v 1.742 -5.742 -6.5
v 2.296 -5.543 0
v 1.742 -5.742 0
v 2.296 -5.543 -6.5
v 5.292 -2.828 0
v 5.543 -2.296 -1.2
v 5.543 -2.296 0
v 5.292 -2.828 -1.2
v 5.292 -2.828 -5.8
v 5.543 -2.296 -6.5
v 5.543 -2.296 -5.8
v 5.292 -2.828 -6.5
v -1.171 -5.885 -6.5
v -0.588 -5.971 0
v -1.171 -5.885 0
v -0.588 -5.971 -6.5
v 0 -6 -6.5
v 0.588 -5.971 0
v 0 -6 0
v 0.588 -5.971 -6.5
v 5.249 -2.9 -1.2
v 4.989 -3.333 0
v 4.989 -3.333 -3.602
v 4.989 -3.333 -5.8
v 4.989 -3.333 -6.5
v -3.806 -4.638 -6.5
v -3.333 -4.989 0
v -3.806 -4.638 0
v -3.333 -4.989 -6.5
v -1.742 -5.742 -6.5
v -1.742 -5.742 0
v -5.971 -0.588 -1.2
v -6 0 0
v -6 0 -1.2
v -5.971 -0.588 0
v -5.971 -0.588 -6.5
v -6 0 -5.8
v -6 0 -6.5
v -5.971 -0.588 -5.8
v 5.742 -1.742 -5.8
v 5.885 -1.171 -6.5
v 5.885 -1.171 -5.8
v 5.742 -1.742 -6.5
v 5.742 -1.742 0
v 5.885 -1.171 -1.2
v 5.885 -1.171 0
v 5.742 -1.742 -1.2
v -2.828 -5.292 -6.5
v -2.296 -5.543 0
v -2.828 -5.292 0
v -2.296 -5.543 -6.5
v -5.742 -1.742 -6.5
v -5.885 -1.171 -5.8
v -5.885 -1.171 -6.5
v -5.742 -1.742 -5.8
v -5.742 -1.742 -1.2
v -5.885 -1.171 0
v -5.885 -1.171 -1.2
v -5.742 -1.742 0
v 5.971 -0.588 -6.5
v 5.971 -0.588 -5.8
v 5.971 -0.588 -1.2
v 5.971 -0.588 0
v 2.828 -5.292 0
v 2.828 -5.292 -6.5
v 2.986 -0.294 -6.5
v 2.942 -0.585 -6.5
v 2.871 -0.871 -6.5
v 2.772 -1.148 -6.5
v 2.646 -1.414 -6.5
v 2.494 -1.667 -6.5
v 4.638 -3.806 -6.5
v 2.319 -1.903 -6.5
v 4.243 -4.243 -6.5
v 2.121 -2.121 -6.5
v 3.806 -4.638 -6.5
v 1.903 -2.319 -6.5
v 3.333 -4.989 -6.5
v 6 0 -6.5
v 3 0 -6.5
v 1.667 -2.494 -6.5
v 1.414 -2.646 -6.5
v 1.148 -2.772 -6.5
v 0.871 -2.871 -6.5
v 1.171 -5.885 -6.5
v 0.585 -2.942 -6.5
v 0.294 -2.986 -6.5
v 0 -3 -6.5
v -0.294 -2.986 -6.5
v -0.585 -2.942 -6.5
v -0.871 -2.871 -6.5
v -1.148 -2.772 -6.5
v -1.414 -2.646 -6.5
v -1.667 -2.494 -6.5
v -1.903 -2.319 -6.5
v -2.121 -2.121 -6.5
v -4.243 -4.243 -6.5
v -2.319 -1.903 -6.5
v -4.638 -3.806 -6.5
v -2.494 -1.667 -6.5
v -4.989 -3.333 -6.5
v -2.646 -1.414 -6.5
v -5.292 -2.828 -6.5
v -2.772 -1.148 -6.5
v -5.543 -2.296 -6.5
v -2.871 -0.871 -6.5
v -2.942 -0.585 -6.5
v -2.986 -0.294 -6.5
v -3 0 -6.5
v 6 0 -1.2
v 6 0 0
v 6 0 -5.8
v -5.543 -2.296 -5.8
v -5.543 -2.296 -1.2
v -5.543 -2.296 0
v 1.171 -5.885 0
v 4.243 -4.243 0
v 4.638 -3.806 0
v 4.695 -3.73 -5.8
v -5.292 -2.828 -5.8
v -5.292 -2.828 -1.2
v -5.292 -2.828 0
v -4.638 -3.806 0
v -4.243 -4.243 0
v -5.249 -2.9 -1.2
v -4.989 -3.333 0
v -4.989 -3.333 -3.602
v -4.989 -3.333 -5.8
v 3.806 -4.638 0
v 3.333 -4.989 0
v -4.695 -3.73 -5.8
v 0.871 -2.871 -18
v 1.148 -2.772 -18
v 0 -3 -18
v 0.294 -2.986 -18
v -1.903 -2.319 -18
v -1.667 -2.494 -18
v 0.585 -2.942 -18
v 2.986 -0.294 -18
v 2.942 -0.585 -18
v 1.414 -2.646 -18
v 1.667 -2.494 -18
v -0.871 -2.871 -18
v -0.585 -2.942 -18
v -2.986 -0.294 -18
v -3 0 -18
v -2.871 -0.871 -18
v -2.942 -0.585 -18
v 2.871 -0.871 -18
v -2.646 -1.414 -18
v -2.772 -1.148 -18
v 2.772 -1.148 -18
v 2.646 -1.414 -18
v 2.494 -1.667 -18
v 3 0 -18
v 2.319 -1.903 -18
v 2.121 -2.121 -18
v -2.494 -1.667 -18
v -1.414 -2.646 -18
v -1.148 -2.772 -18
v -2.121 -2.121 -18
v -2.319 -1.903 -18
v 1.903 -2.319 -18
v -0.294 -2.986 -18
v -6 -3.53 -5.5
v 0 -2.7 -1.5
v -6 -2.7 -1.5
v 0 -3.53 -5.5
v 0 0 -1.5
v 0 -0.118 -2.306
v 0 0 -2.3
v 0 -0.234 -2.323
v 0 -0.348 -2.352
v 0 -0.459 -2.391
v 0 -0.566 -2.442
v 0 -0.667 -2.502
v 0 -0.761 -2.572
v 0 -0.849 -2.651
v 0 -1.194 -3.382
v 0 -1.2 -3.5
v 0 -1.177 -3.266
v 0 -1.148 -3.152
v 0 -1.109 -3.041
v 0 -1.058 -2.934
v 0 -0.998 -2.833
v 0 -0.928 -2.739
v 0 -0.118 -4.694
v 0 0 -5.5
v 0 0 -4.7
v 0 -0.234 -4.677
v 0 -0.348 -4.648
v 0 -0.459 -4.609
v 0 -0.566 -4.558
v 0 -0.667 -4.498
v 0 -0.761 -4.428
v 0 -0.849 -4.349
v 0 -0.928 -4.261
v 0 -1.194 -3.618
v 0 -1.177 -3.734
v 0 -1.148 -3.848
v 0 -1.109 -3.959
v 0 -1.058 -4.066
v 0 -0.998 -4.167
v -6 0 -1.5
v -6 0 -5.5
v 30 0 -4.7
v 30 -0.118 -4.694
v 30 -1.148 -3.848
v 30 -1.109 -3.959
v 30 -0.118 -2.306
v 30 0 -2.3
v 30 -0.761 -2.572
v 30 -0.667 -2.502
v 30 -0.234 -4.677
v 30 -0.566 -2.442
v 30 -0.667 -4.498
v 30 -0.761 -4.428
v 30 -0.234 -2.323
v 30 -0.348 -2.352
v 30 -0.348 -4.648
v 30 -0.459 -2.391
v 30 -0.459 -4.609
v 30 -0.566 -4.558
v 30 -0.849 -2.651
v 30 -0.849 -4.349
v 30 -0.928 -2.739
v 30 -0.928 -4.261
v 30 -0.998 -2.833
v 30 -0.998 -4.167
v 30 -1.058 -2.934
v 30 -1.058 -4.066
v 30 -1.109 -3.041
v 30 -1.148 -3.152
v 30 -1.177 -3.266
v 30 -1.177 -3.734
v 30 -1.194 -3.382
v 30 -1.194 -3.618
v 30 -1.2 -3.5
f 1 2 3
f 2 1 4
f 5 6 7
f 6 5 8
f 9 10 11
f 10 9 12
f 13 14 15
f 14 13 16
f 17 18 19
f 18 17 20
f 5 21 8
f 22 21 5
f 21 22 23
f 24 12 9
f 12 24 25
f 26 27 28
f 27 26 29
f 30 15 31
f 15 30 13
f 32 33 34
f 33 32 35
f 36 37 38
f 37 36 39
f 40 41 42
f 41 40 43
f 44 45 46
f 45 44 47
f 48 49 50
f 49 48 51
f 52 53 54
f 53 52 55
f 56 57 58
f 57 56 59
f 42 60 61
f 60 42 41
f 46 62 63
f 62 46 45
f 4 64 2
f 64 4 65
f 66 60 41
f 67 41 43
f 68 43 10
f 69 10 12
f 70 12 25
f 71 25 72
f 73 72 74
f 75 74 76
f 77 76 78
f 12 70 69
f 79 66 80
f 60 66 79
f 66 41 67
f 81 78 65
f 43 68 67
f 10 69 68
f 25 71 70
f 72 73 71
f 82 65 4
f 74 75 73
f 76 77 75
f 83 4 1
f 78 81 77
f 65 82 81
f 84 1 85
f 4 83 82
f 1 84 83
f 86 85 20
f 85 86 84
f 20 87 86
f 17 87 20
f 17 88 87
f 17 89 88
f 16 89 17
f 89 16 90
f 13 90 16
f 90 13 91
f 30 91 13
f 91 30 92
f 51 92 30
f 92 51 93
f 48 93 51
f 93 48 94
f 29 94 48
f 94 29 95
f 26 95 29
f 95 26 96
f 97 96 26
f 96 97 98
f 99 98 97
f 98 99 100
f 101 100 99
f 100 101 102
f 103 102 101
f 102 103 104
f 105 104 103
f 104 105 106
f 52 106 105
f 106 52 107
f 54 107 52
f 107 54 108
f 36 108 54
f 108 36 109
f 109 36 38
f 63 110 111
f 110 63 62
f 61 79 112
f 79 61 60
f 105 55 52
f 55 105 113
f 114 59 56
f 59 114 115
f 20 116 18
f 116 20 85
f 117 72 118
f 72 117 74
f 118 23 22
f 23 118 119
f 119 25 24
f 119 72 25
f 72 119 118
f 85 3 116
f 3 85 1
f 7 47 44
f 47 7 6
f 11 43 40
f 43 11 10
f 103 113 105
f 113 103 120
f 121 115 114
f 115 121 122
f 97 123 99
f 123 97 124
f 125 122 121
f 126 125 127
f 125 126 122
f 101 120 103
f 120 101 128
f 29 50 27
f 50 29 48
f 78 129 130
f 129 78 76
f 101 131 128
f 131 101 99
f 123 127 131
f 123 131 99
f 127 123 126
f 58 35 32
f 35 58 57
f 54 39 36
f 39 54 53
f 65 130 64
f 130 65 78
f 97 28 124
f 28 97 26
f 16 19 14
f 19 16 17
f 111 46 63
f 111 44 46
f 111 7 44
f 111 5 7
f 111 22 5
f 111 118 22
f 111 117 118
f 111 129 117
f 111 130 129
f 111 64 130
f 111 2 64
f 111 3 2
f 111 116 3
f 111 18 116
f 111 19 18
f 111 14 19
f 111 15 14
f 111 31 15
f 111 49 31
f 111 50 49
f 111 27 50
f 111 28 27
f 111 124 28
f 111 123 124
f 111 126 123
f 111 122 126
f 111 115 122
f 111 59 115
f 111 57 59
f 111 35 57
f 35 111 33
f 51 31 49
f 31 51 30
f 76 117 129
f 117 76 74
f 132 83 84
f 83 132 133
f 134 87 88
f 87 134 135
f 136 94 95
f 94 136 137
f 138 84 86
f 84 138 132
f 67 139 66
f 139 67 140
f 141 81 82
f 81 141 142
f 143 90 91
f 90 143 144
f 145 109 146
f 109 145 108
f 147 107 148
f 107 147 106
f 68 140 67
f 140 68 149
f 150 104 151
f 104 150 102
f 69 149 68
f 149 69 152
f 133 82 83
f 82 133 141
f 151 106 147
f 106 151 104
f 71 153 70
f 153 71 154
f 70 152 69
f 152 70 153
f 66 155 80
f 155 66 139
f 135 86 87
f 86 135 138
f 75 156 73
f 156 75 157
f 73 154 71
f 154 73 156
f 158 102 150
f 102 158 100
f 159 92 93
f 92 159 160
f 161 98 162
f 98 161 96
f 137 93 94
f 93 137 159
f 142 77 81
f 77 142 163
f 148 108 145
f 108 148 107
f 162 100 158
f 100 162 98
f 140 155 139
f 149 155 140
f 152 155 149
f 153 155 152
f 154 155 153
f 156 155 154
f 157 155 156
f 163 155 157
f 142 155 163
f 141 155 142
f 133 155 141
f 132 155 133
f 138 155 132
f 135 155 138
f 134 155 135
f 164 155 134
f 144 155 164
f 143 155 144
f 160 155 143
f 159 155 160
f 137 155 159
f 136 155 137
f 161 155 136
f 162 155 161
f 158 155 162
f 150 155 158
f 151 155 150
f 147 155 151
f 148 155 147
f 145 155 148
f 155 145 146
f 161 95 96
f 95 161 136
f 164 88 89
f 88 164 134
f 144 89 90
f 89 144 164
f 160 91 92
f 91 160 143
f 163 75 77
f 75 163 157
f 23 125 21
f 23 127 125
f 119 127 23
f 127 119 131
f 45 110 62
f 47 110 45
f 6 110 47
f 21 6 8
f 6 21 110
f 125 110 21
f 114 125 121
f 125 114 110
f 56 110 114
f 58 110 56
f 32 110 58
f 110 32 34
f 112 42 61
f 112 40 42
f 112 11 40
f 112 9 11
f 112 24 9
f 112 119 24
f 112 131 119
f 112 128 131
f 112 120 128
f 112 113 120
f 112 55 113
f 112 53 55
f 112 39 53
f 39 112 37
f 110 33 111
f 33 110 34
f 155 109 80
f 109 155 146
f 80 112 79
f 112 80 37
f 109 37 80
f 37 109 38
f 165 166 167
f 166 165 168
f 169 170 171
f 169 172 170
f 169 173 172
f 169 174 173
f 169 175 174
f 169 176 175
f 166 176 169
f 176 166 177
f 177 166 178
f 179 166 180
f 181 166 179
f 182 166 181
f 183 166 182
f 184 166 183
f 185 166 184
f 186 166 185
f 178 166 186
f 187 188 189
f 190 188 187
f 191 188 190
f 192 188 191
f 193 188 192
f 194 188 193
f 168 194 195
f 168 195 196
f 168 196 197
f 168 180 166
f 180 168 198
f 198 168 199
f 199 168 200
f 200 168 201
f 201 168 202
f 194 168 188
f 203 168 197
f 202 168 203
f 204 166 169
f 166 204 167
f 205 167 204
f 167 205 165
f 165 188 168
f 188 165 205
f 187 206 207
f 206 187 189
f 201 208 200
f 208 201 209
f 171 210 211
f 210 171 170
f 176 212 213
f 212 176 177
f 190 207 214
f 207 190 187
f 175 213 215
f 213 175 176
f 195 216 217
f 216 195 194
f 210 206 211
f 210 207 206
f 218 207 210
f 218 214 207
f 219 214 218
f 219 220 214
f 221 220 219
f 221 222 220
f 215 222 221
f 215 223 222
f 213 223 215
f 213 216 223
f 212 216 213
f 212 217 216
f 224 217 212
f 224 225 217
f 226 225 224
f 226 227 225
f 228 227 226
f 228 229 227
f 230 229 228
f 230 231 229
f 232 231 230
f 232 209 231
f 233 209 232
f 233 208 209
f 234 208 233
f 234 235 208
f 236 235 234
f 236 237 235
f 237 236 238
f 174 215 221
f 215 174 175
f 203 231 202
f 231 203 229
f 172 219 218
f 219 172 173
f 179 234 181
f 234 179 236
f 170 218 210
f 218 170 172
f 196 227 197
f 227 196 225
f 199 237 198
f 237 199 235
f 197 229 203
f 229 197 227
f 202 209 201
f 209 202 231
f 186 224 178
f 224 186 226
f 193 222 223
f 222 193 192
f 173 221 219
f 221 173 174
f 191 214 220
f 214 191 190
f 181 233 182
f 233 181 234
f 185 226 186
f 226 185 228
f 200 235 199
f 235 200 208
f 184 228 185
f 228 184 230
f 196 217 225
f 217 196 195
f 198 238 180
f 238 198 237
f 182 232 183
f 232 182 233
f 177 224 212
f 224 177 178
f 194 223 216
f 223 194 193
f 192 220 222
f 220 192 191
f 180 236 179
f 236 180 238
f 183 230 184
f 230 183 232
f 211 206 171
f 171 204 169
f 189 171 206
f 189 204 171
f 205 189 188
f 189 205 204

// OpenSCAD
// file: B_dovetail.scad
// =============================================================================
// Design B — Co-printed dovetail / T-slot mechanical interlock (PRIMARY)
// =============================================================================
// PETG strut tip ends in a captive dovetail / T-slot socket; the TPU cable is
// terminated in a matching dovetail / T-head co-printed inside the socket.
// Per Edison Phase-3 ANALYSIS 19e0c868 §2 (CAD review) geometry, which
// supersedes the earlier ce84ddf8 §4 numbers:
//   - Node OD:                 12.0 mm (was 9.0; needed for >=2 perimeters
//                                       on the lateral PETG cheeks)
//   - Slot mouth width:         5.4 mm (allows solid bridging over the gap)
//   - TPU head width (undercut):7.06 mm (≈0.83 mm undercut per side)
//   - Slot internal height:     4.0 mm
//   - Slot depth (along strut): 6.0 mm (>=4-6 mm engagement plateau, Wang 2026)
//   - Dovetail flank angle:    22.5° (Wang 2026 shear-strength optimum for
//                                     bi-material FDM rigid-flexible interlock)
//   - Lateral (Y) clearance:    0.20 mm per face (load-bearing fit, Ermolai 2024)
//   - Roof (Z) clearance:       0.30 mm (bridge sag tolerance, Ermolai 2024)
//   - +X exit fillet:           0.5 mm (de-notches TPU cable redirection,
//                                       Frascio 2024)
// Strut runs along +Z; cable exits along +X. The PETG cap above the head
// (the "roof") is the print-in-place bridge that captures the TPU dovetail.
// =============================================================================
include <_common.scad>

slot_mouth   = 5.4;
slot_inner   = 7.06;
slot_height  = 4.0;
slot_depth   = 6.0;       // along strut axis (Z)
flank_deg    = 22.5;      // half-flank, measured from vertical wall
clear_lat    = 0.20;      // lateral (Y, load-bearing) running clearance per face
clear_roof   = 0.30;      // roof (Z) clearance per face — bridge-sag tolerance
mouth_fillet = 0.5;       // PETG slot-mouth +X exit fillet (TPU de-notch)
node_d       = 12.0;      // PETG socket outer diameter near tip

// Dovetail / T-head extruded along +X (X = depth into slot).
// The cross-section in (Y,Z) is wider at the bottom (slot_inner) than the
// top (slot_mouth) — that is the "captive" undercut.
module dovetail_xs(width_top, width_bot, height) {
    polygon(points = [
        [-width_top/2,  height/2],
        [ width_top/2,  height/2],
        [ width_bot/2, -height/2],
        [-width_bot/2, -height/2],
    ]);
}

module designB_petg() {
    difference() {
        union() {
            translate([0, 0, -slot_depth - 0.5])
                cylinder(h=slot_depth + 0.5, d=node_d);
            translate([0, 0, -strut_l])
                cylinder(h=strut_l - slot_depth, d=strut_d);
        }
        // Dovetail pocket — wide at the bottom (captive). Differential clearance:
        // tight on the lateral (Y) load-bearing flanks (`clear_lat`), looser on
        // the roof (Z) for bridge-sag tolerance (`clear_roof`).
        translate([-(node_d/2 + 0.1), 0, -slot_depth/2 - 0.5])
            rotate([90, 0, 90])
                linear_extrude(height = node_d + 0.2 + clear_lat)
                    dovetail_xs(slot_mouth + 2*clear_lat,
                                slot_inner + 2*clear_lat,
                                slot_height + 2*clear_roof);
    }
}

module designB_tpu() {
    // Head: dovetail cross-section extruded along the slot depth (the -X half of
    // the through-slot, x ∈ [-node_d/2, -node_d/2 + slot_depth] = [-6, 0]).
    translate([-node_d/2, 0, -slot_depth/2 - 0.5])
        rotate([90, 0, 90])
            linear_extrude(height = slot_depth)
                dovetail_xs(slot_mouth, slot_inner, slot_height);
    // Cable exits the +X face of the node along the slot centerline (Z = head
    // center, NOT z=0). Starts at x=0 (the +X face of the head) so the cable
    // is mechanically continuous with the dovetail head and emerges through
    // the slot mouth on the +X face of the PETG node.
    translate([0, 0, -slot_depth/2 - 0.5]) rotate([0, 90, 0])
        cylinder(h=cable_l, d=cable_d);
}

module designB() {
    petg() designB_petg();
    tpu()  designB_tpu();
}

designB();
// file: _common.scad
// Shared parameters for the five candidate PETG-strut + TPU-cable joint
// designs explored in `edison-trajectories/joint-design/`.
//
// Coordinate convention (per design): the PETG strut runs along +Z and the
// TPU cable runs along the global +X direction (so the joint plane is the
// X-Z plane). All units in mm. PETG is rendered orange, TPU dark cyan.
strut_d = 6.0;     // PETG strut diameter (matches t3-prism.scad)
cable_d = 2.4;     // TPU cable diameter (matches t3-prism.scad)
strut_l = 18.0;    // visible strut length to render
cable_l = 30.0;    // visible cable length on each side
$fn = 64;

PETG_RGB = [0.95, 0.55, 0.20];
TPU_RGB  = [0.10, 0.55, 0.55];

module petg() { color(PETG_RGB) children(); }
module tpu()  { color(TPU_RGB)  children(); }

// Strut as a vertical capsule along +Z, tip at z = 0, body extending to -strut_l.
module strut_body(length = strut_l, d = strut_d) {
    translate([0, 0, -length]) cylinder(h=length, d=d);
    sphere(d=d);
}

// Straight TPU cable along +X.
module cable_segment(length = cable_l, d = cable_d, x0 = 0) {
    translate([x0, 0, 0])
        rotate([0, 90, 0])
            cylinder(h=length, d=d);
}
// main file
// Section view of Design B — dovetail captive joint cut at Y=0 (keep -Y
// half), color preserved by per-part intersection.
include <_common.scad>
use <B_dovetail.scad>

module half_cube_negY() { translate([-30, -30, -40]) cube([60, 30, 60]); }

petg() intersection() { designB_petg(); half_cube_negY(); }
tpu()  intersection() { designB_tpu();  half_cube_negY(); }
